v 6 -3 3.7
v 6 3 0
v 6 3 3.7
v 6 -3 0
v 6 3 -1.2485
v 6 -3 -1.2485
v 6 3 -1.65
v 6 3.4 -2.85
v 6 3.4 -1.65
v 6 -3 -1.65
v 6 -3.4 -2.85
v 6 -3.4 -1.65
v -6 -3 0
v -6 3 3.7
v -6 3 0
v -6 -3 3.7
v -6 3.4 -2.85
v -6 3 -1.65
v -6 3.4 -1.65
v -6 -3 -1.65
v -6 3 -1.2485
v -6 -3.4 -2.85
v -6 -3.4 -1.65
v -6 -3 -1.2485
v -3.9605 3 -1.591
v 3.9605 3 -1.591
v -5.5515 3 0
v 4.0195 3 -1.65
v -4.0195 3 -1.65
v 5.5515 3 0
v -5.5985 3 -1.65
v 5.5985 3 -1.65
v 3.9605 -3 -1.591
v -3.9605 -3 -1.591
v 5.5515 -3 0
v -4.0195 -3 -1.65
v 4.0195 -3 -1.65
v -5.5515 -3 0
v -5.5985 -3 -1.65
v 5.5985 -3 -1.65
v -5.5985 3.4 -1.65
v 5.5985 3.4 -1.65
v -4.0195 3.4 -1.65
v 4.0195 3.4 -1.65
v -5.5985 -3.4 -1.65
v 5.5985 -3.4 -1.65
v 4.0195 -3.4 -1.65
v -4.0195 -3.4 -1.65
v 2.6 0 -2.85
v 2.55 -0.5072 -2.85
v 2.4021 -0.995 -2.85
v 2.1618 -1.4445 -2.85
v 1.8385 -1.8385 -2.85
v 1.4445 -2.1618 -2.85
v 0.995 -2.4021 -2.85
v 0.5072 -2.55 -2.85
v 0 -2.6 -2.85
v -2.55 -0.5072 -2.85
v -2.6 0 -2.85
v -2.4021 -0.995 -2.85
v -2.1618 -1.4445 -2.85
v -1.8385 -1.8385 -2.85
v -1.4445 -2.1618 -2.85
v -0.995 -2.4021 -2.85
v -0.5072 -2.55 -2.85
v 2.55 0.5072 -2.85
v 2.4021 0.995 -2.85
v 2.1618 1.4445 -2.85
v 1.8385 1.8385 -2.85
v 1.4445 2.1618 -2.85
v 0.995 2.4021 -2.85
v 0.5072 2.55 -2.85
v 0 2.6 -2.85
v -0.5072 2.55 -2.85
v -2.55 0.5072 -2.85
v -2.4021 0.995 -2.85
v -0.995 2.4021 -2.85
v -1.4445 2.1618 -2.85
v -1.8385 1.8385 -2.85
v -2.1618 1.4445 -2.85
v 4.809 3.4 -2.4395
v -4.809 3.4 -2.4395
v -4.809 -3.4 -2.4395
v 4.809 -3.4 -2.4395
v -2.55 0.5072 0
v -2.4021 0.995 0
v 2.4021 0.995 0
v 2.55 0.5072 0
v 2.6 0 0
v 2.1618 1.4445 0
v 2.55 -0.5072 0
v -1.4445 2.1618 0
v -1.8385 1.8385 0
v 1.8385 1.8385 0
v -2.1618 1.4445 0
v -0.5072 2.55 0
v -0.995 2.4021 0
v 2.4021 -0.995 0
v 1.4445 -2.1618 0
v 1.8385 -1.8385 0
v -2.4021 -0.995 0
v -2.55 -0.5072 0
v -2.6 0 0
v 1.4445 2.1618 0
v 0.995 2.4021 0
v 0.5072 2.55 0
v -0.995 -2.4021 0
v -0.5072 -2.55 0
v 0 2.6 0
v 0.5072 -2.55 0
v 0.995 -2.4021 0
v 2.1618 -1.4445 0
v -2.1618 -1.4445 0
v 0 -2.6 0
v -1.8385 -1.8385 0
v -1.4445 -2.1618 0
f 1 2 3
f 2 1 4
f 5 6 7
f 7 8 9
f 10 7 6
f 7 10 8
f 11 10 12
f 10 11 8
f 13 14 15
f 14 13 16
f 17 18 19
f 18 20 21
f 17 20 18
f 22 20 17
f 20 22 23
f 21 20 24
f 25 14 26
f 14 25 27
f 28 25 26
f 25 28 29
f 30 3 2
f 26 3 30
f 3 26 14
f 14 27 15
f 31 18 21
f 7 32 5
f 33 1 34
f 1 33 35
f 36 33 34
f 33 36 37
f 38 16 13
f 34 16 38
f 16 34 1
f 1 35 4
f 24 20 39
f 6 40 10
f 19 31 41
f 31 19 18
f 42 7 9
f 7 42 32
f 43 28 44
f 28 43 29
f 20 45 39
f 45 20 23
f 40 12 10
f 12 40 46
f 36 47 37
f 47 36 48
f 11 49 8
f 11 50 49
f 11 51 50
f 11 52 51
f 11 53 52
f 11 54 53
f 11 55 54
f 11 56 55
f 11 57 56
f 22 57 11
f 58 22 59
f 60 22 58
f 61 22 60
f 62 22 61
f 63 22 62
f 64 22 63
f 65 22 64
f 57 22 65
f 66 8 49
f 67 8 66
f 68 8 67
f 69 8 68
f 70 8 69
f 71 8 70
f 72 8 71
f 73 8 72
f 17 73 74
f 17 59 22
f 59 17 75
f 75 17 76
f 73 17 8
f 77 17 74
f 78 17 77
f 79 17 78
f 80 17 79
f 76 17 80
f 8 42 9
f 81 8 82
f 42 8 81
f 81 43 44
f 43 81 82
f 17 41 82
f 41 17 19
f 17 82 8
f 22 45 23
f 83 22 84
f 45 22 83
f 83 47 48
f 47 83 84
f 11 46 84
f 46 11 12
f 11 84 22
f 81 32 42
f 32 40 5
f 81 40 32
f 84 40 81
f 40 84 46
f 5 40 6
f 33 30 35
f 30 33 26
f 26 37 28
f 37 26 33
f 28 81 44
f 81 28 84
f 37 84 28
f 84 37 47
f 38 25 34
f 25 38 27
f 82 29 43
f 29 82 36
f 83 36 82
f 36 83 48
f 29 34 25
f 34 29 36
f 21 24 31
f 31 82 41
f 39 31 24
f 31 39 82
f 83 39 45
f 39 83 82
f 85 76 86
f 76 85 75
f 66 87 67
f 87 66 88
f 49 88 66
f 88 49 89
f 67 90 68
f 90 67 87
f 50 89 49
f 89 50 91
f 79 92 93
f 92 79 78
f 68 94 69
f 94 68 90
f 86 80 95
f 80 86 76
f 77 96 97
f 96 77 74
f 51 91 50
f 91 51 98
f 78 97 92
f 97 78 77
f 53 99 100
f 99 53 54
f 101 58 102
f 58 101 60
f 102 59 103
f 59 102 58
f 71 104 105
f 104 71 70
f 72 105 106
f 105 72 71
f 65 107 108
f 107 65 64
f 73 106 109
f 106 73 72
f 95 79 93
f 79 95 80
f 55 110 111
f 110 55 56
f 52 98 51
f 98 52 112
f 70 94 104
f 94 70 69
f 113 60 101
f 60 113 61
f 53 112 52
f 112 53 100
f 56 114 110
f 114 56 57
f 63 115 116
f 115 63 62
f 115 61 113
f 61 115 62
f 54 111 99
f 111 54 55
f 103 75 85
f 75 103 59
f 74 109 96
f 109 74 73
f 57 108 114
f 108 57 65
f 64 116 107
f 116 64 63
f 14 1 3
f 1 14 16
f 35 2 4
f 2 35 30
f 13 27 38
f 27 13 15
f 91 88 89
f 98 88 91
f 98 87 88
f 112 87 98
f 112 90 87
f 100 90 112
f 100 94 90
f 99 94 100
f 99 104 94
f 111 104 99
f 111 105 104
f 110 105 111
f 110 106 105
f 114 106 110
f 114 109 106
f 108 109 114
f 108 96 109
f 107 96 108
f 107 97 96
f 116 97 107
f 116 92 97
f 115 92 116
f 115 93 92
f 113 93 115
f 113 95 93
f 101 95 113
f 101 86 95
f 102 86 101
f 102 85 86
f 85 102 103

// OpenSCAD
// Parameters
screw_thread_diameter_mm = 5.0; //[2.5:10.0:0.1]
across_flats_mm = 6.0; //[3.0:12.0:0.1]
thickness_mm = 3.7; //[1.85:7.4:0.1]
thread_pitch_mm = 0.8; //[0.5:1.5:0.05]
t_slot_channel_width_mm = 8.0; //[4.0:16.0:0.1]
t_slot_channel_height_mm = 6.0; //[3.0:12.0:0.1]
t_slot_lip_opening_mm = 6.0; //[3.0:12.0:0.1]
t_slot_lip_thickness_mm = 1.5; //[0.75:3.0:0.1]
nut_length_mm = 12.0; //[6.0:24.0:0.5]
corner_chamfer_mm = 0.2; //[0.0:1.0:0.05]
edge_fillet_radius_mm = 0.0; //[0.0:1.5:0.05]
print_tolerance_mm = 0.2; //[0.0:0.6:0.05]
thread_clearance_mode = 0; //[0:1:1]
overlap_mm = 1.0; //[0.5:2.0:0.1]
retention_depth_mm = 0.8; //[0.4:1.6:0.1]
retention_height_mm = 1.2; //[0.6:2.4:0.1]
anti_rotation_flat_depth_mm = 0.6; //[0.3:1.2:0.1]
lead_in_length_mm = 1.2; //[0.6:3.0:0.1]

// Nut and Washer - detailed geometry
module nut_and_washer() {
  color("Silver") {
    // Nut body
    translate([0, 0, thickness_mm/2])
      cube([nut_length_mm, across_flats_mm, thickness_mm], center=true);
    
    // Washer representation
    translate([0, 0, thickness_mm/2 + overlap_mm/2])
      cylinder(r=screw_thread_diameter_mm/2, h=overlap_mm, center=true, $fn=32);
  }
}

// T-slot nut assembly
module assembly() {
  difference() {
    union() {
      // Nut body with retention profile
      translate([0, 0, 0])
        union() {
          translate([0, 0, 0])
            cube([nut_length_mm, across_flats_mm, thickness_mm], center=true);
          translate([0, 0, -thickness_mm/2 + retention_height_mm/2 - overlap_mm])
            cube([nut_length_mm, across_flats_mm + 2*retention_depth_mm, retention_height_mm], center=true);
        }
    }
    // Anti-rotation flats
    translate([0, across_flats_mm/2 - anti_rotation_flat_depth_mm/2 + overlap_mm, 0])
      cube([nut_length_mm + 2*overlap_mm, anti_rotation_flat_depth_mm, thickness_mm + 2*overlap_mm], center=true);
    translate([0, -across_flats_mm/2 + anti_rotation_flat_depth_mm/2 - overlap_mm, 0])
      cube([nut_length_mm + 2*overlap_mm, anti_rotation_flat_depth_mm, thickness_mm + 2*overlap_mm], center=true);
    
    // Lead-in chamfers
    translate([nut_length_mm/2 - lead_in_length_mm/2 + overlap_mm, 0, 0])
      rotate([0, 45, 0])
      cube([lead_in_length_mm, across_flats_mm + 2*retention_depth_mm + 2*overlap_mm, thickness_mm + 2*overlap_mm], center=true);
    translate([-nut_length_mm/2 + lead_in_length_mm/2 - overlap_mm, 0, 0])
      rotate([0, -45, 0])
      cube([lead_in_length_mm, across_flats_mm + 2*retention_depth_mm + 2*overlap_mm, thickness_mm + 2*overlap_mm], center=true);
    
    // Threaded hole
    translate([0, 0, 0])
      cylinder(r=(screw_thread_diameter_mm + print_tolerance_mm + thread_clearance_mode*print_tolerance_mm)/2, h=thickness_mm + 2*overlap_mm, center=true, $fn=32);
  }
  // Nut and washer
  nut_and_washer();
}

assembly();
